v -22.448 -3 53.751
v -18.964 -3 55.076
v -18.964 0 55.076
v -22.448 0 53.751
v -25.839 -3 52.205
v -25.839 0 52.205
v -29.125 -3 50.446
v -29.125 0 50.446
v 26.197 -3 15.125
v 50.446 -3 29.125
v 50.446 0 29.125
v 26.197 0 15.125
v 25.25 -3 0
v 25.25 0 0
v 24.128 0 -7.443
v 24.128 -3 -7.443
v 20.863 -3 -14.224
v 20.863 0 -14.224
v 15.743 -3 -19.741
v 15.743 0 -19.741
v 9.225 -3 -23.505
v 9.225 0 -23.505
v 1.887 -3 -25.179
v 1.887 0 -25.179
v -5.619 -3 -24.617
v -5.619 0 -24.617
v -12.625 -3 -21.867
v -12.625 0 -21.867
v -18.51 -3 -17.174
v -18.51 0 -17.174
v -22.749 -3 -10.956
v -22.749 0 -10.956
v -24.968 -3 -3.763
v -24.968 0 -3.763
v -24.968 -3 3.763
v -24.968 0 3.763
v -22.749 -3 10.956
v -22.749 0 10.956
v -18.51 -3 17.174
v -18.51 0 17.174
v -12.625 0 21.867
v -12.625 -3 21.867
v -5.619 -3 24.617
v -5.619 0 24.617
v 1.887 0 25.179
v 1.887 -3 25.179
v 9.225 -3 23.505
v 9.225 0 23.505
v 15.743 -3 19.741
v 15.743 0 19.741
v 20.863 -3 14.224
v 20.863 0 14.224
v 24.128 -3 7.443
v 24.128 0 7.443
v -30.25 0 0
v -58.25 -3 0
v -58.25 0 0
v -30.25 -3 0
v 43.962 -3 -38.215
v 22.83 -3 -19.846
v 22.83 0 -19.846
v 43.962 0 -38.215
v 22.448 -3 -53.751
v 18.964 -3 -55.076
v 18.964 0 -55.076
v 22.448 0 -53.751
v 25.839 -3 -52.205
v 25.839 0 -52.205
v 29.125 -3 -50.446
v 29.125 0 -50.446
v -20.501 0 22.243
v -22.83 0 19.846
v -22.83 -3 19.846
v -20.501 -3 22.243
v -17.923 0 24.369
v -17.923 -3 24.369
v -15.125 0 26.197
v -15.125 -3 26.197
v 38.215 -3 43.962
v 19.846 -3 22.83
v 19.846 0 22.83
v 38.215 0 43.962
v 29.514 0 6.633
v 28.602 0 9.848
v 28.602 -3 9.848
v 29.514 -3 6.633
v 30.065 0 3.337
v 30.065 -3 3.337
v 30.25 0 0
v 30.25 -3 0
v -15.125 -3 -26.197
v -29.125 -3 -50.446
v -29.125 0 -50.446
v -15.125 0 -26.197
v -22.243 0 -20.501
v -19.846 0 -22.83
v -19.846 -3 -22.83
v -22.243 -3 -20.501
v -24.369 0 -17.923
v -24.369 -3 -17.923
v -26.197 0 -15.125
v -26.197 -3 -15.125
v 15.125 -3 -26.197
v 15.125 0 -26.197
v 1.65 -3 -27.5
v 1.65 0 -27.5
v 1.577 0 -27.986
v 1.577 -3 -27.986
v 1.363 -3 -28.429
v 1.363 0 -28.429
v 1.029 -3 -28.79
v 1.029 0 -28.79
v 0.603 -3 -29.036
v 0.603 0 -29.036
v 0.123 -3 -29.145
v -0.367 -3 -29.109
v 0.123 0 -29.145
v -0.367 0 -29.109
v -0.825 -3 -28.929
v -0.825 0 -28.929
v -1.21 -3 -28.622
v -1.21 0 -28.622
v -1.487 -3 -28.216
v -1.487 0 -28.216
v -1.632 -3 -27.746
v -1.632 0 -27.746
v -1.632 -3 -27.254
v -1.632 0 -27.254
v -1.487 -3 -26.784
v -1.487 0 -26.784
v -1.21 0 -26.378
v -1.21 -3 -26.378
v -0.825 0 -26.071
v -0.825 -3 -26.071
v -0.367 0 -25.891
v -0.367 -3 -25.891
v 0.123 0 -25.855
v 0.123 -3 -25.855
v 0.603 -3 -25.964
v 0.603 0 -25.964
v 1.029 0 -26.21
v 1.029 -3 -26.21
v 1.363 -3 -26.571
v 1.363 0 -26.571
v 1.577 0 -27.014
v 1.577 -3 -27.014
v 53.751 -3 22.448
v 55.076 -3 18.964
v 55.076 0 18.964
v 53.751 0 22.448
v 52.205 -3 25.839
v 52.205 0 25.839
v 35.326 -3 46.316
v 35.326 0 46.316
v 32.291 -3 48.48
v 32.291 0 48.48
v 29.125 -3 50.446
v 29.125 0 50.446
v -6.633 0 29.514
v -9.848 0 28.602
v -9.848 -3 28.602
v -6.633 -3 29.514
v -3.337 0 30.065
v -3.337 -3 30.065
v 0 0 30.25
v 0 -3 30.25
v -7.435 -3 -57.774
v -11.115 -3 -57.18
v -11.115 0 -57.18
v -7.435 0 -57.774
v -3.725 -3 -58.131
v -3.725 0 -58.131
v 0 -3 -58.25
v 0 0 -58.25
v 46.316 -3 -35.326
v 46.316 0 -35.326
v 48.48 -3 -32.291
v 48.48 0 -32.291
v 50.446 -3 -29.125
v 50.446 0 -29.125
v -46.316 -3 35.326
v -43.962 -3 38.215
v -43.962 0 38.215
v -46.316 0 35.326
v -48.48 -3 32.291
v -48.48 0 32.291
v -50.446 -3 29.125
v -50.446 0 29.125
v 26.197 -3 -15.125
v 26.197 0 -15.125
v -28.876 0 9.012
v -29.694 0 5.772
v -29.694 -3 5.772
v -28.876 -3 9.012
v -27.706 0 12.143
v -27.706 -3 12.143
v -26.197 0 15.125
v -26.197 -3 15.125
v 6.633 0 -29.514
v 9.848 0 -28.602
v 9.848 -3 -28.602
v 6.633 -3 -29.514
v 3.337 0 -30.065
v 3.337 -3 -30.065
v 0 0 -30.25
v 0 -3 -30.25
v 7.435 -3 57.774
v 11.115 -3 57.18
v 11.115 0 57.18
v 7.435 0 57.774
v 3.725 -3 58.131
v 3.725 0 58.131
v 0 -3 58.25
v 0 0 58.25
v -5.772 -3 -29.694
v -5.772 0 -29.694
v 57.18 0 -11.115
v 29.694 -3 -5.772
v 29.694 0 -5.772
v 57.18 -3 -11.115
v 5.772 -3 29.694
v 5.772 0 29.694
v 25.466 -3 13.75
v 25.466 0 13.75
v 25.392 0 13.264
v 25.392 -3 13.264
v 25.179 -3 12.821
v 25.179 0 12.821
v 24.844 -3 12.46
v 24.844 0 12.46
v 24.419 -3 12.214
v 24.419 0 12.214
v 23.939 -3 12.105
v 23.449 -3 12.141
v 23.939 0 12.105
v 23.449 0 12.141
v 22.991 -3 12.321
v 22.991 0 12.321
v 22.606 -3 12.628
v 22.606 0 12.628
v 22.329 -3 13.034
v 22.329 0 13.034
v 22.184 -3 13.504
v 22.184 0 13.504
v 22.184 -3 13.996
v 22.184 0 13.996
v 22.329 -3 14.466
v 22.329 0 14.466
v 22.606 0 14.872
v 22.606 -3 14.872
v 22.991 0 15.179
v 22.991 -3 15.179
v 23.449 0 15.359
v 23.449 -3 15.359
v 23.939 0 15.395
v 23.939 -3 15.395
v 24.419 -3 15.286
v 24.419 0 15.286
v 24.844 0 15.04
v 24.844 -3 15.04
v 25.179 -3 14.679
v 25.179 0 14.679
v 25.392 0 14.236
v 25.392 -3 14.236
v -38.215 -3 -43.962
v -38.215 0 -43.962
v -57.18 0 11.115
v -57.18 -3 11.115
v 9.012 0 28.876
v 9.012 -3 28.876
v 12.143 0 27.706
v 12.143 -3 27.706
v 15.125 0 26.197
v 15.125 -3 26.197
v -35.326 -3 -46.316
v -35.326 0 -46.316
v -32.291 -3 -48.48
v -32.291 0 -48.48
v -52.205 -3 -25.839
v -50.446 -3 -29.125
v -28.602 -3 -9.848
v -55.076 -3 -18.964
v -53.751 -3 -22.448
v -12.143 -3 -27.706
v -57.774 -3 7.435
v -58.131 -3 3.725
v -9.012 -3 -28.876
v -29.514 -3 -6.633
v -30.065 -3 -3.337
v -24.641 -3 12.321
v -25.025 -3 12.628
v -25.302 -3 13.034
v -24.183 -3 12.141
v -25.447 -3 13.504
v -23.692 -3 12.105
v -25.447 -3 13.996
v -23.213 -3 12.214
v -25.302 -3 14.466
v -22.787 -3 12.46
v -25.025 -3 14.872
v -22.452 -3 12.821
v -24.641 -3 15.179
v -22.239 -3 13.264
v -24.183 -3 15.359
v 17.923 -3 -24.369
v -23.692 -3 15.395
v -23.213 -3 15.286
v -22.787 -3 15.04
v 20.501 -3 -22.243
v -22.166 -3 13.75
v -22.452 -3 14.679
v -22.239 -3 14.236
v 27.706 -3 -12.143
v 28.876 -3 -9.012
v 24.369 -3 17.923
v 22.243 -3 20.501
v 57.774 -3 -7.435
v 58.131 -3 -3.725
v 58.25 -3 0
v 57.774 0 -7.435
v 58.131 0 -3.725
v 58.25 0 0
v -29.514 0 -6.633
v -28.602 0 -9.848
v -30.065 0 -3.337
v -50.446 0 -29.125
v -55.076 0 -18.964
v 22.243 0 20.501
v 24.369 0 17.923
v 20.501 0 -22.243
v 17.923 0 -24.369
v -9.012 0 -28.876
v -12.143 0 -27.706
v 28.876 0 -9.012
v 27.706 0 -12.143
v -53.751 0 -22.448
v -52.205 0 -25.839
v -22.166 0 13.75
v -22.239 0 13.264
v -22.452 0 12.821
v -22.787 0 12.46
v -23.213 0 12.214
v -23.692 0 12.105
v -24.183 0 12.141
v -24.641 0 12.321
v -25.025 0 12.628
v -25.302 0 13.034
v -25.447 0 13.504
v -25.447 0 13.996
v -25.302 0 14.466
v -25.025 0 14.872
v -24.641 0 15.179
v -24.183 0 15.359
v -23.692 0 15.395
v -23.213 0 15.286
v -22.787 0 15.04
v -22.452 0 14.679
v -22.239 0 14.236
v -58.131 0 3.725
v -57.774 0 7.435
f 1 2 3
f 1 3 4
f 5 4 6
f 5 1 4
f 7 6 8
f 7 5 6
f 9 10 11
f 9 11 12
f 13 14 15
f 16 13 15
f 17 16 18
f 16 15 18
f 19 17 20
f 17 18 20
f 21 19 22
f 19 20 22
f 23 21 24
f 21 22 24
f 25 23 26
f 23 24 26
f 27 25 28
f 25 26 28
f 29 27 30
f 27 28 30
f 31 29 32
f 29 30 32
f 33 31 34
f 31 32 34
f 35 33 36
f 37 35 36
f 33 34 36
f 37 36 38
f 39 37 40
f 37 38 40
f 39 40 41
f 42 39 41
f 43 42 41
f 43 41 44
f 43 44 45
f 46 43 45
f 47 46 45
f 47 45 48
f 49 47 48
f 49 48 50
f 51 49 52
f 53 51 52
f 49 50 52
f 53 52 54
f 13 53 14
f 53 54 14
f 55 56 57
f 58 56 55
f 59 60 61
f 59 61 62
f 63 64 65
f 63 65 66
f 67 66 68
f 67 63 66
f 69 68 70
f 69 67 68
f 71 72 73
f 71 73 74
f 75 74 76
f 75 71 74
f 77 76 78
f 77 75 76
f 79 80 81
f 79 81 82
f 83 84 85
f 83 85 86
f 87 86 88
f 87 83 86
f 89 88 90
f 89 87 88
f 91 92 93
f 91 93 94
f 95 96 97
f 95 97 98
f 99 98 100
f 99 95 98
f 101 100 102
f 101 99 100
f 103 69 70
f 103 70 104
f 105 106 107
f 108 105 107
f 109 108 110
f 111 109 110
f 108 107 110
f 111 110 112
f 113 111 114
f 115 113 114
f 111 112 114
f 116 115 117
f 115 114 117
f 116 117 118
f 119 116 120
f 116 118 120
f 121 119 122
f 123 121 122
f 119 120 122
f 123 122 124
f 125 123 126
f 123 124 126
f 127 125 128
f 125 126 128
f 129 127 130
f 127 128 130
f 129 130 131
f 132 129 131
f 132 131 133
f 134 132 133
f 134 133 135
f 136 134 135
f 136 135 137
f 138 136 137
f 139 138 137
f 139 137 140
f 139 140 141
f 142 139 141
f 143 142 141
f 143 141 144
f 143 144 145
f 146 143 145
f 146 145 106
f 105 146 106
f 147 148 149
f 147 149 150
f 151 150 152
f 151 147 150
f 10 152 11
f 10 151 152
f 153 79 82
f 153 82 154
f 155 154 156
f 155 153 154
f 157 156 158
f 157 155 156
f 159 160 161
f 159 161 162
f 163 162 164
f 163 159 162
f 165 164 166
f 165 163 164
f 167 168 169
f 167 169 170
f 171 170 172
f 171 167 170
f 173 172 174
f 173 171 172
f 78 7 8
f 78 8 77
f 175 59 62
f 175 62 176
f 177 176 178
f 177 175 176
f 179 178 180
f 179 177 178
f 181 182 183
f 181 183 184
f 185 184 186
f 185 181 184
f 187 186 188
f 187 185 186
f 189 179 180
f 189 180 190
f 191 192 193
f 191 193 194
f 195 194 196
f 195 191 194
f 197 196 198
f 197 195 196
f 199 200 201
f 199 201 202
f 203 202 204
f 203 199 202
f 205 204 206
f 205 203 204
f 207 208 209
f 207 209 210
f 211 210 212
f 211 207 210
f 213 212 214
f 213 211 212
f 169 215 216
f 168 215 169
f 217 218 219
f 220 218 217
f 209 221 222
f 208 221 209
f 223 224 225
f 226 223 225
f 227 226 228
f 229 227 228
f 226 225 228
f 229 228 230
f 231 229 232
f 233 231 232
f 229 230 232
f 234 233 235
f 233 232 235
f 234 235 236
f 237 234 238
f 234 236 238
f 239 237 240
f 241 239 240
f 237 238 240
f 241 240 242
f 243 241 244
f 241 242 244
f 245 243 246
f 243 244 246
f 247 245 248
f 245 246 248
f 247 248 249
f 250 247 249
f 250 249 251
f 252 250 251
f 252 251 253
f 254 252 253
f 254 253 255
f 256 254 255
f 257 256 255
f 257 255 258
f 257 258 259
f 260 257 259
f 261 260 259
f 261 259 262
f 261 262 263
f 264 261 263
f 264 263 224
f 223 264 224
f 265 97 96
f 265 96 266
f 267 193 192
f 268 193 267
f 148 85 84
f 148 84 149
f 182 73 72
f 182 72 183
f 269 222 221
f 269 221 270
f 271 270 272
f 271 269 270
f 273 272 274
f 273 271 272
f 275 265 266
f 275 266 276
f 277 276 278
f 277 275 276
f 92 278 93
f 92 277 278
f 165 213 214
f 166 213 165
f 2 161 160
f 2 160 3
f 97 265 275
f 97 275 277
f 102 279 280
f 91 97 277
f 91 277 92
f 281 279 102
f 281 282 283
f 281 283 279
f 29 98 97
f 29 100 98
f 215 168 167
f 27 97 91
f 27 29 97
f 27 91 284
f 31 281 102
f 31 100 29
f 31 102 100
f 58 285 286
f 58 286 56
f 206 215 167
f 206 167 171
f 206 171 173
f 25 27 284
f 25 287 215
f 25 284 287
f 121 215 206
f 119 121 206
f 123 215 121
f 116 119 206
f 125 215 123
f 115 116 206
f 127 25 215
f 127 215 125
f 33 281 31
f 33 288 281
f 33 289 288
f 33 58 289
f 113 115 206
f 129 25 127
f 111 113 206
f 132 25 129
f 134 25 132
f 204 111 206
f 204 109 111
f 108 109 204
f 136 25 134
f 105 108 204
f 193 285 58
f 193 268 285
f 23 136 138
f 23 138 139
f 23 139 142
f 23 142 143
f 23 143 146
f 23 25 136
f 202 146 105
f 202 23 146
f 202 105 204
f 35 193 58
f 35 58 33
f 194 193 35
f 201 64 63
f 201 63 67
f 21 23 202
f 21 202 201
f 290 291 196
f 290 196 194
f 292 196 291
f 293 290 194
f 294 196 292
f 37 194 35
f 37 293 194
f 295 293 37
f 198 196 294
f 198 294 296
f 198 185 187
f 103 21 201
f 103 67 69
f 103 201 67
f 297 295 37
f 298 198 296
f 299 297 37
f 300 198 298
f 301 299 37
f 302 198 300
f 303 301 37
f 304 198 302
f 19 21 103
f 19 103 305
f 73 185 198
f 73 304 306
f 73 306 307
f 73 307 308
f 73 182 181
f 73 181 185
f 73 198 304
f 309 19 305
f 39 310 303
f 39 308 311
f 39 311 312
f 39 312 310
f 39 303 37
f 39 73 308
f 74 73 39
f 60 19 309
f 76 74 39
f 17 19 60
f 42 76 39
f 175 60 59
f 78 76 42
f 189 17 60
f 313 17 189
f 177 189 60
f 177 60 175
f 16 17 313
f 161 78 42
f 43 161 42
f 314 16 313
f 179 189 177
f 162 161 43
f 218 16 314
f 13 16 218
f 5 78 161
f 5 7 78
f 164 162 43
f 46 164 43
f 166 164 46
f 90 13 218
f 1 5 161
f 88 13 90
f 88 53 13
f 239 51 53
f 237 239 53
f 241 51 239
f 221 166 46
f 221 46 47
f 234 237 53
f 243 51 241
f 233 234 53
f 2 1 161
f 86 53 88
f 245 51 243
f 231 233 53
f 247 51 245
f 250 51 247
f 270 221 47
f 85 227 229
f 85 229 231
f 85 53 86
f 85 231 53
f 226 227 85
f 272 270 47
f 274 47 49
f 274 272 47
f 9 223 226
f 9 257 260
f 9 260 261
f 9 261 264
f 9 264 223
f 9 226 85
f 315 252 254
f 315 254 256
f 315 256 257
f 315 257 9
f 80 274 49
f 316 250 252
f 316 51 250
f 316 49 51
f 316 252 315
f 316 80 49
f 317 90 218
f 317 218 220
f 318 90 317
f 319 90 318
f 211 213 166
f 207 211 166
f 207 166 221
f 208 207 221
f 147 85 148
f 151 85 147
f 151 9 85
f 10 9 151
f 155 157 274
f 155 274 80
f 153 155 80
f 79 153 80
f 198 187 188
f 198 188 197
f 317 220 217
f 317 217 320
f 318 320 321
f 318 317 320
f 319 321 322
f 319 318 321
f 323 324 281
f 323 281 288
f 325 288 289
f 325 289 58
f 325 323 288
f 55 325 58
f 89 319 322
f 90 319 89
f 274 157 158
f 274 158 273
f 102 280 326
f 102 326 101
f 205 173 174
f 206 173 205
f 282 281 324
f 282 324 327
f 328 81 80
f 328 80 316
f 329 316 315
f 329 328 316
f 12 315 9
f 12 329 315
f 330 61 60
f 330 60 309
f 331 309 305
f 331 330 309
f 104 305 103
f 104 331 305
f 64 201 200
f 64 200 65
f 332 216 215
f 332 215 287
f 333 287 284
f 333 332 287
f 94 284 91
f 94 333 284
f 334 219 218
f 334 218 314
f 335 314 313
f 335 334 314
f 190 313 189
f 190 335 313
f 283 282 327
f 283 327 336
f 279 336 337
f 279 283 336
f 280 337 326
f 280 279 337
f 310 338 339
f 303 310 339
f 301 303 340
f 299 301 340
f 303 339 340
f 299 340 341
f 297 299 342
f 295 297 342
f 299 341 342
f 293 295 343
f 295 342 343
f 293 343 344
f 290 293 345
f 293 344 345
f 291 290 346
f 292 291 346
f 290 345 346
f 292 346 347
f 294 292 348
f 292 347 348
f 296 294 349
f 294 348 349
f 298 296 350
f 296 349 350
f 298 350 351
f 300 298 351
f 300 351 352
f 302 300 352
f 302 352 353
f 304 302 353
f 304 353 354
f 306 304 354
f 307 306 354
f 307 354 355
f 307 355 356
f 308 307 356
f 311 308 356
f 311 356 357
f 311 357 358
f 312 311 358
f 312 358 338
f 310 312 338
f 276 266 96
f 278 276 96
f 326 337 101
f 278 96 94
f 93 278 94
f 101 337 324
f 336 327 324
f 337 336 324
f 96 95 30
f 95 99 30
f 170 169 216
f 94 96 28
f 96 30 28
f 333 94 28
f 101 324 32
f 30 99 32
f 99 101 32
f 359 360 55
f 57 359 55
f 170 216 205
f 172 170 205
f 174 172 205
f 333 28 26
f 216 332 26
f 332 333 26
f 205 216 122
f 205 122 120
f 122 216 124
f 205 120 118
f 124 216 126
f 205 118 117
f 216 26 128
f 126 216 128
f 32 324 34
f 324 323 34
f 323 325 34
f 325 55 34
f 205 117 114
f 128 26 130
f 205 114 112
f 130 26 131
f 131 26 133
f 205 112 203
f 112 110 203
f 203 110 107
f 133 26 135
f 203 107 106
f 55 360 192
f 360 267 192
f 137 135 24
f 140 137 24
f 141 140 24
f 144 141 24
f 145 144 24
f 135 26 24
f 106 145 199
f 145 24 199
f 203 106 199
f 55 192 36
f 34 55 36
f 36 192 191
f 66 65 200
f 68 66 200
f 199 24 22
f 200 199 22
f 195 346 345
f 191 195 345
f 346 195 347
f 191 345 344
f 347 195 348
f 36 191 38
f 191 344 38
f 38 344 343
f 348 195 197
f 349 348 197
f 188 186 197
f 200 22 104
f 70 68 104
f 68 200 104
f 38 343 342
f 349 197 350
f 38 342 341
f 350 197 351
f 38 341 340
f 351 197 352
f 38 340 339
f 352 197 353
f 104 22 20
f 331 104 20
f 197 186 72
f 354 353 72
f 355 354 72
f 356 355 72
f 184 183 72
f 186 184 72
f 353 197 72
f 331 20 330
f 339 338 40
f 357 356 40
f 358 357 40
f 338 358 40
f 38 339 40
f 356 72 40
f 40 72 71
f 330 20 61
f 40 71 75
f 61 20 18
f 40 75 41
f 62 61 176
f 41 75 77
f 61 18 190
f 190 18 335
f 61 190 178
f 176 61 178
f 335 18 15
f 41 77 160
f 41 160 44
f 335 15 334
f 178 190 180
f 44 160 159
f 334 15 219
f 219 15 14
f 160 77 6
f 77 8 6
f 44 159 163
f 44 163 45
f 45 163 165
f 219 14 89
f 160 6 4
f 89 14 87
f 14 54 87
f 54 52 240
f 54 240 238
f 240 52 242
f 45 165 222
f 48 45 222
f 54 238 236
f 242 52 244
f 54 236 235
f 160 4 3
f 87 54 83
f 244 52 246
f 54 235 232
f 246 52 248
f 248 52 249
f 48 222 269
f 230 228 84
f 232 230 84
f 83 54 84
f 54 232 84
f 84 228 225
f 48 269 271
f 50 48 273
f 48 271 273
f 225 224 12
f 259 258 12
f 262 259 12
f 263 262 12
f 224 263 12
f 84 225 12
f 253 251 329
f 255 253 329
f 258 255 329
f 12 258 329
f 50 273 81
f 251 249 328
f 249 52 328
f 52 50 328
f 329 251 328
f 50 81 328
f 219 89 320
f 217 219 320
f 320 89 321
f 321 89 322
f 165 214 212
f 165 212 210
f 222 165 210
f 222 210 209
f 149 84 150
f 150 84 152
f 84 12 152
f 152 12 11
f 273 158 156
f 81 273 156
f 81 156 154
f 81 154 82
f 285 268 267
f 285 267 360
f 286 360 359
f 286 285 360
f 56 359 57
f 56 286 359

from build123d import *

# Parameters (mm, degrees)
SKETCH1_R           = 30.25
SKETCH1_R_2         = 25.25
EXTRUDE_THIN1_DEPTH = 3
SKETCH2_R           = 1.65
CUT_EXTRUDE3_DEPTH  = 10
BOSS_EXTRUDE1_DEPTH = 3


with BuildPart() as part:
    # Sketch1 → Extrude-Thin1 (new body)
    with BuildSketch(Plane(origin=(0, 0, 0), x_dir=(1, 0, 0), z_dir=(0, 1, 0))):
        Circle(SKETCH1_R)
        Circle(SKETCH1_R_2, mode=Mode.SUBTRACT)
    extrude(amount=-EXTRUDE_THIN1_DEPTH)

    # Sketch2 → Cut-Extrude3 (cut)
    with BuildSketch(Plane(origin=(0, 0, 0), x_dir=(1, 0, 0), z_dir=(0, 1, 0))):
        with Locations((0, 27.5)):
            Circle(SKETCH2_R)
        with Locations((23.815698604, -13.75)):
            Circle(SKETCH2_R)
        with Locations((-23.815698604, -13.75)):
            Circle(SKETCH2_R)
    extrude(amount=-CUT_EXTRUDE3_DEPTH, mode=Mode.SUBTRACT)

    # Sketch5 → Boss-Extrude1 (add)
    with BuildSketch(Plane.XZ.offset(3)):
        with BuildLine():
            Line((0, 58.25), (0, 30.25))
            ThreePointArc((0, 30.25), (2.899334014, 30.110735001), (5.77197211, 29.694222299))
            Line((5.77197211, 29.694222299), (11.114623981, 57.179783436))
            ThreePointArc((11.114623981, 57.179783436), (5.583015084, 57.981828555), (0, 58.25))
        make_face()
        with BuildLine():
            Line((29.125, 50.44597977), (15.125, 26.197268464))
            ThreePointArc((15.125, 26.197268464), (17.56626441, 24.62699443), (19.845785627, 22.829964802))
            Line((19.845785627, 22.829964802), (38.215438439, 43.961833048))
            ThreePointArc((38.215438439, 43.961833048), (33.82594717, 47.422228944), (29.125, 50.44597977))
        make_face()
        with BuildLine():
            Line((50.44597977, 29.125), (26.197268464, 15.125))
            ThreePointArc((26.197268464, 15.125), (27.526328444, 12.54447059), (28.601936912, 9.848436672))
            Line((28.601936912, 9.848436672), (55.076457029, 18.964344997))
            ThreePointArc((55.076457029, 18.964344997), (53.005244029, 24.155881385), (50.44597977, 29.125))
        make_face()
        with BuildLine():
            Line((58.25, 0), (30.25, 0))
            ThreePointArc((30.25, 0), (30.110735001, -2.899334014), (29.694222299, -5.77197211))
            Line((29.694222299, -5.77197211), (57.179783436, -11.114623981))
            ThreePointArc((57.179783436, -11.114623981), (57.981828555, -5.583015084), (58.25, 0))
        make_face()
        with BuildLine():
            Line((50.44597977, -29.125), (26.197268464, -15.125))
            ThreePointArc((26.197268464, -15.125), (24.62699443, -17.56626441), (22.829964802, -19.845785627))
            Line((22.829964802, -19.845785627), (43.961833048, -38.215438439))
            ThreePointArc((43.961833048, -38.215438439), (47.422228944, -33.82594717), (50.44597977, -29.125))
        make_face()
        with BuildLine():
            Line((29.125, -50.44597977), (15.125, -26.197268464))
            ThreePointArc((15.125, -26.197268464), (12.54447059, -27.526328444), (9.848436672, -28.601936912))
            Line((9.848436672, -28.601936912), (18.964344997, -55.076457029))
            ThreePointArc((18.964344997, -55.076457029), (24.155881385, -53.005244029), (29.125, -50.44597977))
        make_face()
        with BuildLine():
            Line((0, -58.25), (0, -30.25))
            ThreePointArc((0, -30.25), (-2.899334014, -30.110735001), (-5.77197211, -29.694222299))
            Line((-5.77197211, -29.694222299), (-11.114623981, -57.179783436))
            ThreePointArc((-11.114623981, -57.179783436), (-5.583015084, -57.981828555), (0, -58.25))
        make_face()
        with BuildLine():
            Line((-29.125, -50.44597977), (-15.125, -26.197268464))
            ThreePointArc((-15.125, -26.197268464), (-17.56626441, -24.62699443), (-19.845785627, -22.829964802))
            Line((-19.845785627, -22.829964802), (-38.215438439, -43.961833048))
            ThreePointArc((-38.215438439, -43.961833048), (-33.82594717, -47.422228944), (-29.125, -50.44597977))
        make_face()
        with BuildLine():
            Line((-50.44597977, -29.125), (-26.197268464, -15.125))
            ThreePointArc((-26.197268464, -15.125), (-27.526328444, -12.54447059), (-28.601936912, -9.848436672))
            Line((-28.601936912, -9.848436672), (-55.076457029, -18.964344997))
            ThreePointArc((-55.076457029, -18.964344997), (-53.005244029, -24.155881385), (-50.44597977, -29.125))
        make_face()
        with BuildLine():
            Line((-58.25, 0), (-30.25, 0))
            ThreePointArc((-30.25, 0), (-30.110735001, 2.899334014), (-29.694222299, 5.77197211))
            Line((-29.694222299, 5.77197211), (-57.179783436, 11.114623981))
            ThreePointArc((-57.179783436, 11.114623981), (-57.981828555, 5.583015084), (-58.25, 0))
        make_face()
        with BuildLine():
            Line((-50.44597977, 29.125), (-26.197268464, 15.125))
            ThreePointArc((-26.197268464, 15.125), (-24.62699443, 17.56626441), (-22.829964802, 19.845785627))
            Line((-22.829964802, 19.845785627), (-43.961833048, 38.215438439))
            ThreePointArc((-43.961833048, 38.215438439), (-47.422228944, 33.82594717), (-50.44597977, 29.125))
        make_face()
        with BuildLine():
            Line((-29.125, 50.44597977), (-15.125, 26.197268464))
            ThreePointArc((-15.125, 26.197268464), (-12.54447059, 27.526328444), (-9.848436672, 28.601936912))
            Line((-9.848436672, 28.601936912), (-18.964344997, 55.076457029))
            ThreePointArc((-18.964344997, 55.076457029), (-24.155881385, 53.005244029), (-29.125, 50.44597977))
        make_face()
    extrude(amount=-BOSS_EXTRUDE1_DEPTH)


solid = part.part
